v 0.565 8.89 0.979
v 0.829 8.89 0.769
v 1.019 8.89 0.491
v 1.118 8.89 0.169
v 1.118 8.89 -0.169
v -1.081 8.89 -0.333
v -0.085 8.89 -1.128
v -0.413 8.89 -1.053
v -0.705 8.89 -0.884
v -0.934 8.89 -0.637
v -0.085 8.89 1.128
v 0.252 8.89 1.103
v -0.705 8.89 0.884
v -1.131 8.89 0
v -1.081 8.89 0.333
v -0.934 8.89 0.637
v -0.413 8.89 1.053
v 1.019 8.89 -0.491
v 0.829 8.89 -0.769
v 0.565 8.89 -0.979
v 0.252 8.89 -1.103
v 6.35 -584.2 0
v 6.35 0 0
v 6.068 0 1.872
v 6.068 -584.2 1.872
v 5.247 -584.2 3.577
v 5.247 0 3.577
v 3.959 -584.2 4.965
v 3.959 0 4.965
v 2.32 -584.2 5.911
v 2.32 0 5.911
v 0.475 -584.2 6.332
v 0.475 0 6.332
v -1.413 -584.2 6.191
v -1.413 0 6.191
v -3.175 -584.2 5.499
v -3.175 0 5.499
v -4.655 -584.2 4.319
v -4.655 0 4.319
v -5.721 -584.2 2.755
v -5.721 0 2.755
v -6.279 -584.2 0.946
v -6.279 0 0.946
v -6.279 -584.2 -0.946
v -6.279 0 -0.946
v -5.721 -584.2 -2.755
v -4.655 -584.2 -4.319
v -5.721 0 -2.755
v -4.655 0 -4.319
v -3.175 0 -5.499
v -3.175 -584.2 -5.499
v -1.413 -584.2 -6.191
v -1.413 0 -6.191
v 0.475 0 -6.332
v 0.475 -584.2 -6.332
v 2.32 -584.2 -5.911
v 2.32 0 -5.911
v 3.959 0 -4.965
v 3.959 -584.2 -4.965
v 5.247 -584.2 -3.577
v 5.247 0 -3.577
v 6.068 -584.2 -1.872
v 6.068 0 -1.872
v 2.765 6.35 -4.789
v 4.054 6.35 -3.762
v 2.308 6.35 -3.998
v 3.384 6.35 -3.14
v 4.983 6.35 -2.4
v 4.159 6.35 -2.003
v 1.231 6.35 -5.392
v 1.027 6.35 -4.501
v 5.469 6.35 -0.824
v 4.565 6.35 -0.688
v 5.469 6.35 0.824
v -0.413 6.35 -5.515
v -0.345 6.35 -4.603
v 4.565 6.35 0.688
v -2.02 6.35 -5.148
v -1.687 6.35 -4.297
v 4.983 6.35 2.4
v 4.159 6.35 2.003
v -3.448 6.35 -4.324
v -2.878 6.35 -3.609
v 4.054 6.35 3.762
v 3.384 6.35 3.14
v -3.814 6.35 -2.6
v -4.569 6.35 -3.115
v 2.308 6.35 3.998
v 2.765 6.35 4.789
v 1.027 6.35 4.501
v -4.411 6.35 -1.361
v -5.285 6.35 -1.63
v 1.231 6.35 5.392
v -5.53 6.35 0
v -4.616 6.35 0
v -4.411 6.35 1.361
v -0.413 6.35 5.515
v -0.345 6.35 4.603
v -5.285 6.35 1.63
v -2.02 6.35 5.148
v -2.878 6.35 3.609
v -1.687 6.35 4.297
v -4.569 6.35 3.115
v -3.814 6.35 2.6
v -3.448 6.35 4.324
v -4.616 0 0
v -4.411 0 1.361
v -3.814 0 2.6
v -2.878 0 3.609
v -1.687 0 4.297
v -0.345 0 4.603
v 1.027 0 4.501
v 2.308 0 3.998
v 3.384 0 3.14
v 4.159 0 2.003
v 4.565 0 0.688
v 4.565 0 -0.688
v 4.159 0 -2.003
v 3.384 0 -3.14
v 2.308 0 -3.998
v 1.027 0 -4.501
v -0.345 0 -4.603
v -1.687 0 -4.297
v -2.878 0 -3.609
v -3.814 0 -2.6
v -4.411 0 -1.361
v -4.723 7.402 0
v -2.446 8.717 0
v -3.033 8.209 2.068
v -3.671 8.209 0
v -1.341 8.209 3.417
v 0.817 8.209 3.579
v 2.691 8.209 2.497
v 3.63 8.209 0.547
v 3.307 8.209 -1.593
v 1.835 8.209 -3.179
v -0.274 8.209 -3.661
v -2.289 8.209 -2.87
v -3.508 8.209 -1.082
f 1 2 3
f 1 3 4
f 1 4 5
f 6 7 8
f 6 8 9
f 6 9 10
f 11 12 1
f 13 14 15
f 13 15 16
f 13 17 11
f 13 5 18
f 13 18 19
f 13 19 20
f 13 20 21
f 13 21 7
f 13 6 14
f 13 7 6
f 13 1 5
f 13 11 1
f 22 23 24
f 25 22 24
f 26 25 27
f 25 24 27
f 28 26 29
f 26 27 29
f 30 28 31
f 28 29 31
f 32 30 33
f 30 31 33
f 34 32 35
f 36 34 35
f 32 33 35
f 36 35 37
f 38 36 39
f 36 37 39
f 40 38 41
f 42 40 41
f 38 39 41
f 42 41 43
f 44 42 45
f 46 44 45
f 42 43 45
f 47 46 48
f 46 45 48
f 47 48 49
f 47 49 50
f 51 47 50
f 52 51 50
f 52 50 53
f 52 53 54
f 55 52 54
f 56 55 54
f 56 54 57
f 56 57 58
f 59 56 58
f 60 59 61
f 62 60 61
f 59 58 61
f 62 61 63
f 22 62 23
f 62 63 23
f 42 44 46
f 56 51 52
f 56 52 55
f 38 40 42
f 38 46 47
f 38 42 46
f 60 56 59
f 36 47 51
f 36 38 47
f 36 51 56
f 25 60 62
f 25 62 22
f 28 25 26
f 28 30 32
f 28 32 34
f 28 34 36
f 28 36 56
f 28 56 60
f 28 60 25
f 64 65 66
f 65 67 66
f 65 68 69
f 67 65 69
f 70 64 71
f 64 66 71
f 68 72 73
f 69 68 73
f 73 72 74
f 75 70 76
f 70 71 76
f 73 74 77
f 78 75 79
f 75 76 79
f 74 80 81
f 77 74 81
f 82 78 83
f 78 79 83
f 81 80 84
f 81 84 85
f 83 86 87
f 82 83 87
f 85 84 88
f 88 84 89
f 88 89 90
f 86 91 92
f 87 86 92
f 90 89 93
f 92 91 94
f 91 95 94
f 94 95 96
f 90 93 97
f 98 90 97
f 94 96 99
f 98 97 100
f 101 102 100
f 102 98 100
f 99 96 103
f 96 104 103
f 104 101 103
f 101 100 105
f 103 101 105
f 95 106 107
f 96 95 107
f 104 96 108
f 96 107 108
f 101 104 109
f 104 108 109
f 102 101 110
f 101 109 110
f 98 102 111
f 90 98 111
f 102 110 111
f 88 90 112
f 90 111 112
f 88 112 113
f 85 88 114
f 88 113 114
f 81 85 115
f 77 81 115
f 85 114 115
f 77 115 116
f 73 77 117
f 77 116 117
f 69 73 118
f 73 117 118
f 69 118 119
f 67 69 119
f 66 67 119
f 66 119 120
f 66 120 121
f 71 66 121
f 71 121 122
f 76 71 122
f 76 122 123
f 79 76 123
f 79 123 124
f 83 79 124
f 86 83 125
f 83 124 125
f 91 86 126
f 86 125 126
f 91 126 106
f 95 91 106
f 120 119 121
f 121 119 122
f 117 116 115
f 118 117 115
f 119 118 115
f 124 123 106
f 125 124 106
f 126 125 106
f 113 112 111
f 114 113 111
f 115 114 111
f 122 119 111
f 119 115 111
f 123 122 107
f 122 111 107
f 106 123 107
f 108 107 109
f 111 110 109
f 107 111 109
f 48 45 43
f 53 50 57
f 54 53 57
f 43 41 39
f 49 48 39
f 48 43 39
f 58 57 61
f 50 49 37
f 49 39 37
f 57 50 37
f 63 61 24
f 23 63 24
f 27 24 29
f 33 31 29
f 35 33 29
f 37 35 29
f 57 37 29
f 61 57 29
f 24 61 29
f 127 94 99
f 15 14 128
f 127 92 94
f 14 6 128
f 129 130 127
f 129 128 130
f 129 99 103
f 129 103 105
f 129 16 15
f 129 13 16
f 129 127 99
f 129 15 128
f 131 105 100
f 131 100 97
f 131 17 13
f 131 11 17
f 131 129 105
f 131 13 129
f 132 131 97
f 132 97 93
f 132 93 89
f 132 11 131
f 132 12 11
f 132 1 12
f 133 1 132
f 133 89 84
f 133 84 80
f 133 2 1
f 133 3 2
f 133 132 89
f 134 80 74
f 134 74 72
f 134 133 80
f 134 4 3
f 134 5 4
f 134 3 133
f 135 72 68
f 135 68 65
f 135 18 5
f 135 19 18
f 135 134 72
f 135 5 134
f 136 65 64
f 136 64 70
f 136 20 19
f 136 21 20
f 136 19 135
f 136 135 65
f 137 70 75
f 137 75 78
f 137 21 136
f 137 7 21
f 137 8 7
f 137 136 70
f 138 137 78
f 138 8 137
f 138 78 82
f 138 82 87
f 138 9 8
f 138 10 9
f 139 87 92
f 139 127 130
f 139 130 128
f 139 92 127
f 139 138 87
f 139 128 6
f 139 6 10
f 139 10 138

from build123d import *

# Parameters (mm, degrees)
F0_R     = 6.35
F1_DEPTH = 584.2
F2_R     = 4.6163674118
F3_DEPTH = 6.35
F4_R     = 5.5303676916
F5_DEPTH = 2.54


# Not quite as in the source:
# - a fillet or chamfer that OpenCascade refuses, or shapes differently, is made with other operations: its cross-section is extruded or revolved along the edge and cut away or added


with BuildPart() as f1:
    # F0 (on Front) → F1 (new body)
    with BuildSketch(Plane.XZ):
        Circle(F0_R)
    extrude(amount=F1_DEPTH)


with BuildPart() as f3:
    # F2 (on face) → F3 (new body)
    with BuildSketch(Plane(origin=(0, 0, 0), x_dir=(-1, 0, 0), z_dir=(0, 1, 0))):
        Circle(F2_R)
    extrude(amount=F3_DEPTH)

    # F4 (on face) → F5 (join)
    with BuildSketch(Plane(origin=(0, 6.35, 0), x_dir=(-1, 0, 0), z_dir=(0, 1, 0))):
        Circle(F4_R)
    extrude(amount=F5_DEPTH)

    # F6: fillet of radius 5.08 on 1 edges, made by hand

    # F6_s1 → F6_t2 (revolve, cut)
    with BuildSketch(Plane.XY):
        with BuildLine():
            ThreePointArc((-5.5303676916, 6.35), (-3.6709586404, 8.2094090512), (-1.1309586404, 8.89))
            Line((-1.1309586404, 8.89), (-5.5303676916, 8.89))
            Line((-5.5303676916, 8.89), (-5.5303676916, 6.35))
        make_face()
    revolve(axis=Axis((0, 8.89, 0), (0, 1, 0)), mode=Mode.SUBTRACT)


solid = Compound([f1.part, f3.part])
